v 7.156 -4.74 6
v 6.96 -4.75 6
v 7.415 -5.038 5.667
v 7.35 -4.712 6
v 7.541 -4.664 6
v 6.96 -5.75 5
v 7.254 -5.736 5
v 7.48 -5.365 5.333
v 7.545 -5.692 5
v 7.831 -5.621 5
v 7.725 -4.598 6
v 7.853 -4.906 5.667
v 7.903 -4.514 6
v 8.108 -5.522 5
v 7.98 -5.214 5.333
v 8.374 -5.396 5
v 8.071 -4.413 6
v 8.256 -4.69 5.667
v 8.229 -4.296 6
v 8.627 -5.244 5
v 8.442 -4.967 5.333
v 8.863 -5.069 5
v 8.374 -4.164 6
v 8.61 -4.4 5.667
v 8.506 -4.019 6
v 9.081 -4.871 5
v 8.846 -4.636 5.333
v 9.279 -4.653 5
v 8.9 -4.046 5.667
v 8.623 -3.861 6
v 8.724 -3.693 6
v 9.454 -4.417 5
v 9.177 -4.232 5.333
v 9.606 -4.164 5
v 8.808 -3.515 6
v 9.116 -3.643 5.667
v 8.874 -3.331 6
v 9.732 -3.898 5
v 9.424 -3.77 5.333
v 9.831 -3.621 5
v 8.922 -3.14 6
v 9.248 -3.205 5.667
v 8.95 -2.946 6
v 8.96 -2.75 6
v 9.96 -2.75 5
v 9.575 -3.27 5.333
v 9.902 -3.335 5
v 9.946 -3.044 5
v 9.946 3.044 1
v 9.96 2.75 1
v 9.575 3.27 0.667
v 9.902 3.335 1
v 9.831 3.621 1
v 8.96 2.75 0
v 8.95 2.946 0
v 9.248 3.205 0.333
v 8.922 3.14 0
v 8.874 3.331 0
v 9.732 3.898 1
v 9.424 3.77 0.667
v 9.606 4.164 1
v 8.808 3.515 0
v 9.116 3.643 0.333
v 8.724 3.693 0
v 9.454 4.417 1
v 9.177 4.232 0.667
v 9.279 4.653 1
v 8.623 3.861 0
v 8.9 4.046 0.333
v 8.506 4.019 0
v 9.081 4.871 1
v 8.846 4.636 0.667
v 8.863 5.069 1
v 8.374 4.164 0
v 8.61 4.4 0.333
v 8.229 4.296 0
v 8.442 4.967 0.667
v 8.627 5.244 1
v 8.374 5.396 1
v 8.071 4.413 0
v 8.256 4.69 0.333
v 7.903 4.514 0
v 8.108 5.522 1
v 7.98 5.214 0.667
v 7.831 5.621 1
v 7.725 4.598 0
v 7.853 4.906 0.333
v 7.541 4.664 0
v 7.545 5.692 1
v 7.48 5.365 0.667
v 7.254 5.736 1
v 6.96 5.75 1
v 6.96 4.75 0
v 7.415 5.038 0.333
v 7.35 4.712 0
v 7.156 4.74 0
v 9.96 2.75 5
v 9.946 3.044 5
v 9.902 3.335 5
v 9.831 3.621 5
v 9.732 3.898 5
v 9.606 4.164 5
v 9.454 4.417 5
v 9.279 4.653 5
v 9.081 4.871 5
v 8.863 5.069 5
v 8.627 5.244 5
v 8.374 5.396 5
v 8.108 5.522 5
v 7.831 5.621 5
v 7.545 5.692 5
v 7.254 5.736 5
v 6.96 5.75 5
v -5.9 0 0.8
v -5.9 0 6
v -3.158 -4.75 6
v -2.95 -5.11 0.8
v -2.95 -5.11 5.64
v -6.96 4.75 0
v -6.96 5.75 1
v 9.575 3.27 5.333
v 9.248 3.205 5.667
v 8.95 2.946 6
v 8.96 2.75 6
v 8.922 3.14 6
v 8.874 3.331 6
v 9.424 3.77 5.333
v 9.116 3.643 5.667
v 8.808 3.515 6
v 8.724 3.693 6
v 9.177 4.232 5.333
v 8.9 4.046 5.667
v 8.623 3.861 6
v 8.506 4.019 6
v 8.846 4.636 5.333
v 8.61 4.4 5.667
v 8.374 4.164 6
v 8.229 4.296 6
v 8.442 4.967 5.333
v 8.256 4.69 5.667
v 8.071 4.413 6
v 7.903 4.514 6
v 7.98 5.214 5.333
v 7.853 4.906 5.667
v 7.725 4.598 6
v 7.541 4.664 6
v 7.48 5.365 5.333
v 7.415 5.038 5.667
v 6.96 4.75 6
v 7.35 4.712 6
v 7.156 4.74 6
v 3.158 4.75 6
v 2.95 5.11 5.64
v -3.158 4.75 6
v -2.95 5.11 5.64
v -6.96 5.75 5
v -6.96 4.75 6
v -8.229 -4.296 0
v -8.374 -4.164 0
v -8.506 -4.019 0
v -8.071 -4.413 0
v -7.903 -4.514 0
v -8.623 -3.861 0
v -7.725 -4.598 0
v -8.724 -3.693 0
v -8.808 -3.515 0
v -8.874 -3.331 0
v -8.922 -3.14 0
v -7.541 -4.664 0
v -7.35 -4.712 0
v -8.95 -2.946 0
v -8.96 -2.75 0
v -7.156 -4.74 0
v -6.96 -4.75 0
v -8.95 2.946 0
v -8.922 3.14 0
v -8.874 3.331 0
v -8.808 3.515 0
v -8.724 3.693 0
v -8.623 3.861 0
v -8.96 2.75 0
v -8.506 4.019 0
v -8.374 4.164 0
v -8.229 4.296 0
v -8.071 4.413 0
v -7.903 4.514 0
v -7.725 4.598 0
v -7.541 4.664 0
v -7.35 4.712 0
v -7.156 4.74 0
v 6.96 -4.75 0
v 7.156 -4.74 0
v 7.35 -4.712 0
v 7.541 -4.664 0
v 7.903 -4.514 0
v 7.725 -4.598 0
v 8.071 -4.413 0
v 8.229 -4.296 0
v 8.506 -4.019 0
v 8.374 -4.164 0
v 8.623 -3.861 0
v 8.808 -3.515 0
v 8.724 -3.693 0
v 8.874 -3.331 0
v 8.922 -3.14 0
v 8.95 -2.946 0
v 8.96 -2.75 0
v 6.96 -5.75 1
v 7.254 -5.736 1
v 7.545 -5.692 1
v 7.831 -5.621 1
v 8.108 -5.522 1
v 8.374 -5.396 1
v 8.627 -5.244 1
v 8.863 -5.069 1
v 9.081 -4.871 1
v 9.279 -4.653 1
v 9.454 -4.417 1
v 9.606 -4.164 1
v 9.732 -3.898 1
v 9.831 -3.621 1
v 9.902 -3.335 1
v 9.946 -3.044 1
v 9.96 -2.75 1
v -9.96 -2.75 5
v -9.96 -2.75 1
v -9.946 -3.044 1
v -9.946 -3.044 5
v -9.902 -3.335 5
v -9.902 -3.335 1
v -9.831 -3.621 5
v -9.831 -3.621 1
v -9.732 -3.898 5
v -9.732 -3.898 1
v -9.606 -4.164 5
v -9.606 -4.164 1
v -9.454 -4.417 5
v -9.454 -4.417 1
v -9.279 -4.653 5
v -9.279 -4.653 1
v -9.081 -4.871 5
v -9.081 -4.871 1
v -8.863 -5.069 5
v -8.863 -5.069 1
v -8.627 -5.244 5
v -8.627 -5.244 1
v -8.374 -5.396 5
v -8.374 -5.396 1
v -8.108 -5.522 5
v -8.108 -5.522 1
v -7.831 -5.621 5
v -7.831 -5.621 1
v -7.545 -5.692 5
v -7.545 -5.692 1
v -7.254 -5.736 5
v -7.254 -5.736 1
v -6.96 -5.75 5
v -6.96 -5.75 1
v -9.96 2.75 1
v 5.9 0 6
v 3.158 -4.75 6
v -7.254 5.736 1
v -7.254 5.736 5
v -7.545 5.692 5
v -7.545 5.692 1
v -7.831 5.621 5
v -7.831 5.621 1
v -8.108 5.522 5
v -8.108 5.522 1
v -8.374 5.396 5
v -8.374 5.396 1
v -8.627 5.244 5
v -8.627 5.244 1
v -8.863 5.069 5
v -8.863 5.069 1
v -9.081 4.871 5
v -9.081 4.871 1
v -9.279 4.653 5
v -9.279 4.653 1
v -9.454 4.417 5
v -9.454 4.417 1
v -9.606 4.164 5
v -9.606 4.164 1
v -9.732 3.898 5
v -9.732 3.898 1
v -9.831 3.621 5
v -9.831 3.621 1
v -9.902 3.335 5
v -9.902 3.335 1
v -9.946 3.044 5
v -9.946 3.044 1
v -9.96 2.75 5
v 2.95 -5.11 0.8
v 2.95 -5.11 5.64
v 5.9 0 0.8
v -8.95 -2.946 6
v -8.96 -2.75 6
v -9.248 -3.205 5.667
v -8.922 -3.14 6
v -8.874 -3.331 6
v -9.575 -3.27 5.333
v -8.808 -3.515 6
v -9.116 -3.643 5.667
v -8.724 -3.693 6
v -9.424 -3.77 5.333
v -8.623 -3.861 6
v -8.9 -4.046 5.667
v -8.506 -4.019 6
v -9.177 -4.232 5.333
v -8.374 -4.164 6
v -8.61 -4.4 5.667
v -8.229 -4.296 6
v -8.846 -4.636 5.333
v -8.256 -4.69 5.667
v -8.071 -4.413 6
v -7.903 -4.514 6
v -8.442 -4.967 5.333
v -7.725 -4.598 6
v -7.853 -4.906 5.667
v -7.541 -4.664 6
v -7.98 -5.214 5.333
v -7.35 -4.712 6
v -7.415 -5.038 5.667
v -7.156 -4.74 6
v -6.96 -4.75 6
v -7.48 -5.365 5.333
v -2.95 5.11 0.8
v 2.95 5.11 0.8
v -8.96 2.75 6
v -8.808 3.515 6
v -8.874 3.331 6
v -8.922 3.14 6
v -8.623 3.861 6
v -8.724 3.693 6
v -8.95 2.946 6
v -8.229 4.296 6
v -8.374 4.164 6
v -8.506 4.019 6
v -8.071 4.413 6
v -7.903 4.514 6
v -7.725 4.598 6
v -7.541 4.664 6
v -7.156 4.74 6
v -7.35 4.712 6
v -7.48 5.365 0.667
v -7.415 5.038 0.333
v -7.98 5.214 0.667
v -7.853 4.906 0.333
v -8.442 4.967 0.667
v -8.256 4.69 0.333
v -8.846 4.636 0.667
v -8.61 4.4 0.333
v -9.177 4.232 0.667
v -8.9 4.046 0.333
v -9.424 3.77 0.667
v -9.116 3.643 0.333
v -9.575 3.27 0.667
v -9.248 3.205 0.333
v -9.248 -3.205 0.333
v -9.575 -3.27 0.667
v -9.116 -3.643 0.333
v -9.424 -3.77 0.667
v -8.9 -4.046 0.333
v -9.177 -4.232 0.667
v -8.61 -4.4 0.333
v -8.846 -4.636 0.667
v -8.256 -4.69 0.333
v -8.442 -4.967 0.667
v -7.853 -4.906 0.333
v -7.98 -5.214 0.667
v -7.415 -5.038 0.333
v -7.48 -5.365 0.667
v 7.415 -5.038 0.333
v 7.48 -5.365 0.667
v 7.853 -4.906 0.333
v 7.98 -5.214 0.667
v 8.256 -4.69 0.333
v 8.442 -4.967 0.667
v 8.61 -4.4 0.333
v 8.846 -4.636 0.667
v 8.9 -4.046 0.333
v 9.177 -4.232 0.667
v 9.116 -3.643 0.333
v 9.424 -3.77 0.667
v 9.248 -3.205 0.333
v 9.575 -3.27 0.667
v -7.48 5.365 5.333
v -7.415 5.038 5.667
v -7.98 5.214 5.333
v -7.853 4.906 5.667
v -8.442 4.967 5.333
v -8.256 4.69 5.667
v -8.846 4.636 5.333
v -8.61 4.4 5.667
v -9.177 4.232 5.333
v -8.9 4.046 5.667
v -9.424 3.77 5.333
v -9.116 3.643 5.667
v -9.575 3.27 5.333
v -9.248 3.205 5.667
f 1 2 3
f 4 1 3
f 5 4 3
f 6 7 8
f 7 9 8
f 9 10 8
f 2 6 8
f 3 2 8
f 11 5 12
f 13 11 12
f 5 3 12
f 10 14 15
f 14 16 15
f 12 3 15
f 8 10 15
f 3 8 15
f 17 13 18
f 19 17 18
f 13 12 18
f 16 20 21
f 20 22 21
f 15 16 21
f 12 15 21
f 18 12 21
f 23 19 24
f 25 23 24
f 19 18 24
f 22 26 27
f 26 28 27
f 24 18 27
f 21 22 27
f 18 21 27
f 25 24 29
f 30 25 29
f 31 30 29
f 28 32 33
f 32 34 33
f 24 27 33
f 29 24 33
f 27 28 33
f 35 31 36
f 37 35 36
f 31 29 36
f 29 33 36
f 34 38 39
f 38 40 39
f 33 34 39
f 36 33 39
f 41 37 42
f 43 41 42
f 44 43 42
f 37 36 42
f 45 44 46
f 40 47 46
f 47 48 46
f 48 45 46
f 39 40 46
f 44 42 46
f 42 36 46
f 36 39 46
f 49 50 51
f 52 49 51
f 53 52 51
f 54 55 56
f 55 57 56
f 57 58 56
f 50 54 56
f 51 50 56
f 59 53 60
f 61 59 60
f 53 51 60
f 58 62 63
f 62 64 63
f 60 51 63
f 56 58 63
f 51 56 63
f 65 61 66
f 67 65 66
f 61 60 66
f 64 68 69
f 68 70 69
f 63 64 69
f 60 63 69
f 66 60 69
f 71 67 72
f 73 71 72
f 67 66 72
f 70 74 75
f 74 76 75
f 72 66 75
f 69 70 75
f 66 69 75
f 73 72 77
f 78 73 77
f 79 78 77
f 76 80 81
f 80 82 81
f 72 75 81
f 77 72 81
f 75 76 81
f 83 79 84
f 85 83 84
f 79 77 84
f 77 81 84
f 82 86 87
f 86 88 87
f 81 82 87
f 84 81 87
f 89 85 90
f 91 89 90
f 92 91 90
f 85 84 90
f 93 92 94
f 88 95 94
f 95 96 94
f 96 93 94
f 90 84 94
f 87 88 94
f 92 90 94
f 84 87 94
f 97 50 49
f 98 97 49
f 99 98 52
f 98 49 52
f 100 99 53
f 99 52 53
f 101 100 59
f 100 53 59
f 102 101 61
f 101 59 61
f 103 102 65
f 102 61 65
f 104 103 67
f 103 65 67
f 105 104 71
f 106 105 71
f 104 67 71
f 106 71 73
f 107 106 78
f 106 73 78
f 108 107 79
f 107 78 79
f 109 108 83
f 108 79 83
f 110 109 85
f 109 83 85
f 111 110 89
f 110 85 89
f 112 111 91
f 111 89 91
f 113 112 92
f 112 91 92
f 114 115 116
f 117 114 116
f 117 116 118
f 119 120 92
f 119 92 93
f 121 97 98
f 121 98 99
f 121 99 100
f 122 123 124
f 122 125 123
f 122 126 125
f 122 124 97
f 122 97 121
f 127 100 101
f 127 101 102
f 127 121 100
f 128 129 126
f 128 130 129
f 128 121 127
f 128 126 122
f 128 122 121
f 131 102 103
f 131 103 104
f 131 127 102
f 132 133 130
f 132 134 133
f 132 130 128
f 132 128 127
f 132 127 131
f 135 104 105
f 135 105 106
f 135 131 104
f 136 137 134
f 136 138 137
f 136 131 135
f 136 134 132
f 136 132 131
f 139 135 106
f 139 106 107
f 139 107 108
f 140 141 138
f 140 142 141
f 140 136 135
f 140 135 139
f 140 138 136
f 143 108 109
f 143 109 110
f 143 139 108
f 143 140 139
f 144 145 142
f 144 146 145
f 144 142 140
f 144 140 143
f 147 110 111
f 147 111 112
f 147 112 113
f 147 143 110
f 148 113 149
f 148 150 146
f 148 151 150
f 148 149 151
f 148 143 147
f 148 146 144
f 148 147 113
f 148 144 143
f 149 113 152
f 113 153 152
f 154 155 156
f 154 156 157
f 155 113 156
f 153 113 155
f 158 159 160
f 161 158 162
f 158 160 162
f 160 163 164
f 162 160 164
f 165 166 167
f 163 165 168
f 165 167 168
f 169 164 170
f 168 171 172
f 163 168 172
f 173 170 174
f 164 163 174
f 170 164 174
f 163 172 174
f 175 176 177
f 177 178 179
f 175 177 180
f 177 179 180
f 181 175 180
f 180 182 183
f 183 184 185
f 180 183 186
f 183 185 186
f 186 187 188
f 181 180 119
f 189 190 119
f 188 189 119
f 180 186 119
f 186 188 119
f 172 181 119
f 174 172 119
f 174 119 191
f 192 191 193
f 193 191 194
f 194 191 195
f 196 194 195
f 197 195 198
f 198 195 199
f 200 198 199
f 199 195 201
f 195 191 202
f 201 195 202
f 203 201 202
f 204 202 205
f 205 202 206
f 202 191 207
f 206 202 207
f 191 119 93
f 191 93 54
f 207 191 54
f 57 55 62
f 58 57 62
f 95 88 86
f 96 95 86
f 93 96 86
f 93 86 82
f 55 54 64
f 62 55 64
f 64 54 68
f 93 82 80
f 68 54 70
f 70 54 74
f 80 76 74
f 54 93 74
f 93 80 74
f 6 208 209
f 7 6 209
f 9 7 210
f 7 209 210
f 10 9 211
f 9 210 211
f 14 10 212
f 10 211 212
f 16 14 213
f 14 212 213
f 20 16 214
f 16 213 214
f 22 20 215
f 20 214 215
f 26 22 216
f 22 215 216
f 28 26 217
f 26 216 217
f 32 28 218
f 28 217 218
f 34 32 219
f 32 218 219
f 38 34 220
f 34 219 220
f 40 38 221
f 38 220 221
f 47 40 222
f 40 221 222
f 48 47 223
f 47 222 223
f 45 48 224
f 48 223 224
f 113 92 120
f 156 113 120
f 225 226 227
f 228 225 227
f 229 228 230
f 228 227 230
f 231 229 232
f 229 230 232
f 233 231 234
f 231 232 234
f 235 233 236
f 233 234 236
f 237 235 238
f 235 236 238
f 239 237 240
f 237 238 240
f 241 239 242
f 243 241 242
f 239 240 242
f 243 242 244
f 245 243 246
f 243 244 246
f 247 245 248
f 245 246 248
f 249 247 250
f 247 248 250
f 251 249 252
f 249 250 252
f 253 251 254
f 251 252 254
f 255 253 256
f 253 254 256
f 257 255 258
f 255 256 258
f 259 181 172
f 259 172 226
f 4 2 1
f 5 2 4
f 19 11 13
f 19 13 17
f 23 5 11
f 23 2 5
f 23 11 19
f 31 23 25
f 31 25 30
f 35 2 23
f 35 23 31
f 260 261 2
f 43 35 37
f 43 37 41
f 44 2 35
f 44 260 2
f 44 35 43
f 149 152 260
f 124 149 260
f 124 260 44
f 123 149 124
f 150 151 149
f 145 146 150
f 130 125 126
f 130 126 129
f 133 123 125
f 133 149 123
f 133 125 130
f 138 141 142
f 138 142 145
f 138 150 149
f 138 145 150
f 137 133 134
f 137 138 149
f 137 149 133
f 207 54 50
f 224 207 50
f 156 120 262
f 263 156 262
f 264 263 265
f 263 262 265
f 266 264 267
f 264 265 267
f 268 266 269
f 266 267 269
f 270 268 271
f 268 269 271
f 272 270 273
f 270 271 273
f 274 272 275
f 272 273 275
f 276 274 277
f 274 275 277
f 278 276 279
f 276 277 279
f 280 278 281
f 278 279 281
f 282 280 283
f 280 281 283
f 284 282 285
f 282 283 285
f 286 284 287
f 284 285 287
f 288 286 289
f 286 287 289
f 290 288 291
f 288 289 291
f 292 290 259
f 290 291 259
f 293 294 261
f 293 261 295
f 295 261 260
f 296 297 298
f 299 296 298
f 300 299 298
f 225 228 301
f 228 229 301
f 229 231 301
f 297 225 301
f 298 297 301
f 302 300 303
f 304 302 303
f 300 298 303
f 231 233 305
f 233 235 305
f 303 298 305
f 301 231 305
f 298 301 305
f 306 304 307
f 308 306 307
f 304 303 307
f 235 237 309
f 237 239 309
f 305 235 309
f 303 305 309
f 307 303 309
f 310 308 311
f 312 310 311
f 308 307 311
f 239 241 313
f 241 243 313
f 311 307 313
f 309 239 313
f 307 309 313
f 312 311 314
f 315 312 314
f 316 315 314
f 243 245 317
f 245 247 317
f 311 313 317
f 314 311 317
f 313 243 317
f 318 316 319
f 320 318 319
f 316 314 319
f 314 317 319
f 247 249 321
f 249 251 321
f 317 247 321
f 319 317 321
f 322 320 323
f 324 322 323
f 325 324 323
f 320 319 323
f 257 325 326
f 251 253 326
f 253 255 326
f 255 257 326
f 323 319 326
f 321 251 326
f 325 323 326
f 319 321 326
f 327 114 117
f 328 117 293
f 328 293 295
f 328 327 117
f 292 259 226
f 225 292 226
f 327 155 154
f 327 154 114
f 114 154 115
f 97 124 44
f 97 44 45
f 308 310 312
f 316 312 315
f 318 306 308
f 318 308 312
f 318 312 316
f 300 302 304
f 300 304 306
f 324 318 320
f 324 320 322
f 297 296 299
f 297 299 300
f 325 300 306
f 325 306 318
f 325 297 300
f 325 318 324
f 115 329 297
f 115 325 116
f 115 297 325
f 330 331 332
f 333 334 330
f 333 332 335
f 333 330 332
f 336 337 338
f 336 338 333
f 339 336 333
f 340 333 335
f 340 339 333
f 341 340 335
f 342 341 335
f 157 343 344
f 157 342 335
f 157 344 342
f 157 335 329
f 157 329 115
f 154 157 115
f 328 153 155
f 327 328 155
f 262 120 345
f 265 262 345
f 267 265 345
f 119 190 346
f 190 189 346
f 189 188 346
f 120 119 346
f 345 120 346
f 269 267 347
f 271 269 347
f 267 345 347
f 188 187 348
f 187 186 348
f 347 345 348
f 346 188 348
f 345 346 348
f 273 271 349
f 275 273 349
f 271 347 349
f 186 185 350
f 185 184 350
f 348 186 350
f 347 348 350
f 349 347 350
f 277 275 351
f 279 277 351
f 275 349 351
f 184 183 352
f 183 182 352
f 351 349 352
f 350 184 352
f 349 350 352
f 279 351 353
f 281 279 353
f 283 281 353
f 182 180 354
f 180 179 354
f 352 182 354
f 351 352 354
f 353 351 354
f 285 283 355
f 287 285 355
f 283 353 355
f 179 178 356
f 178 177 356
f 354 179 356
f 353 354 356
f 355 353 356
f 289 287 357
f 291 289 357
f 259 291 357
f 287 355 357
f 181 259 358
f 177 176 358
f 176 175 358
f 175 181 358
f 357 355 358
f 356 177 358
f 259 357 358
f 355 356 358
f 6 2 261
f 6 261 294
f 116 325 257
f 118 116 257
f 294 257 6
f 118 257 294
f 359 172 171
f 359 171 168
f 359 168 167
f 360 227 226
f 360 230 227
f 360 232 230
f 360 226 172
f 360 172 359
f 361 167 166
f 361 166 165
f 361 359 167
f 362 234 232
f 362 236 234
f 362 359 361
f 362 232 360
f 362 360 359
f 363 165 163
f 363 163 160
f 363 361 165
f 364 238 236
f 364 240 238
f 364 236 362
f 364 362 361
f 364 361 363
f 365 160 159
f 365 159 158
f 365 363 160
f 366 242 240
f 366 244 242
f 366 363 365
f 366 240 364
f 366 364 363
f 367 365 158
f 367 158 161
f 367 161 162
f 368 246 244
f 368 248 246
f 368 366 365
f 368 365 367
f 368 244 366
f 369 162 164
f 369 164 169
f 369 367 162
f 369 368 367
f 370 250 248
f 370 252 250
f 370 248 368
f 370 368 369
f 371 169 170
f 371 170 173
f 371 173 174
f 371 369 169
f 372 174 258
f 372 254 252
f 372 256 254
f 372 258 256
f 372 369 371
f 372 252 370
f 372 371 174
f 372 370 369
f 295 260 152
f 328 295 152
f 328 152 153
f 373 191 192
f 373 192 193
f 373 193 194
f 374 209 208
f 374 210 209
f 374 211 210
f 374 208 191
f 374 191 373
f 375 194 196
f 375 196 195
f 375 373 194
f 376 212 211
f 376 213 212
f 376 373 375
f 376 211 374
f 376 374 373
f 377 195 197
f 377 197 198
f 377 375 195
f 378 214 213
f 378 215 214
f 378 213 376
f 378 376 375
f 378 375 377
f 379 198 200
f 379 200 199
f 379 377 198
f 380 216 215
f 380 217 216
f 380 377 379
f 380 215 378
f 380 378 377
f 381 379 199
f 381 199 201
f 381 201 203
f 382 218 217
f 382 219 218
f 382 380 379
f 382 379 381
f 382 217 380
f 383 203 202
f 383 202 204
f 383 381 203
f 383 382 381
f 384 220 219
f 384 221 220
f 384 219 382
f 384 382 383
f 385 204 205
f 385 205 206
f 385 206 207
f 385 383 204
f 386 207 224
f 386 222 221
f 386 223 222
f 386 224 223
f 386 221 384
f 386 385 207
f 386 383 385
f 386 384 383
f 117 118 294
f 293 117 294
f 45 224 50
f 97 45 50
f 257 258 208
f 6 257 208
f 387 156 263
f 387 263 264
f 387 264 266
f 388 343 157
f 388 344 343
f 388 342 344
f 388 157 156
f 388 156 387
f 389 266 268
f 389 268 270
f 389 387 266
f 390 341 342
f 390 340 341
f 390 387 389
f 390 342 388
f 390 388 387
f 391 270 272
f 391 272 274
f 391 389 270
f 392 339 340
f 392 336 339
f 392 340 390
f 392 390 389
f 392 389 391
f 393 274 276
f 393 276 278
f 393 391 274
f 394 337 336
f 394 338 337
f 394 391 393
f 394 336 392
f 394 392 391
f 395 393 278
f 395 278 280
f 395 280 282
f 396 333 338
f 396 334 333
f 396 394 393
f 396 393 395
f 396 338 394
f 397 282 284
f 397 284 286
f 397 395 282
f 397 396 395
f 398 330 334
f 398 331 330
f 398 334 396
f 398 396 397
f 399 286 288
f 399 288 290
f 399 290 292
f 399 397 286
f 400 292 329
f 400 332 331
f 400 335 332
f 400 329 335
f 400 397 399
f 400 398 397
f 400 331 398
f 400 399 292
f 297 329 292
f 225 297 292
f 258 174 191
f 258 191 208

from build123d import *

# Parameters (mm, degrees)
F1_DEPTH     = 6
F3_DEPTH     = 5.2
F4_T1_DEPTH  = 13.92
F4_T3_DEPTH  = 5.5
F4_T6_ANGLE  = 90
F4_T8_ANGLE  = 90
F4_T10_ANGLE = 90
F4_T12_ANGLE = 90
F4_T14_ANGLE = 90
F4_T16_ANGLE = 90
F4_T18_ANGLE = 90
F4_T20_ANGLE = 90


# Not quite as in the source:
# - a fillet or chamfer that OpenCascade refuses, or shapes differently, is made with other operations: its cross-section is extruded or revolved along the edge and cut away or added


with BuildPart() as f1:
    # F0 (on Top) → F1 (new body)
    with BuildSketch(Plane.XY):
        with BuildLine():
            Line((6.96, 5.75), (-6.96, 5.75))
            ThreePointArc((-6.96, 5.75), (-9.0813203436, 4.8713203436), (-9.96, 2.75))
            Line((-9.96, 2.75), (-9.96, -2.75))
            ThreePointArc((-9.96, -2.75), (-9.0813203436, -4.8713203436), (-6.96, -5.75))
            Line((-6.96, -5.75), (6.96, -5.75))
            ThreePointArc((6.96, -5.75), (9.0813203436, -4.8713203436), (9.96, -2.75))
            Line((9.96, -2.75), (9.96, 2.75))
            ThreePointArc((9.96, 2.75), (9.0813203436, 4.8713203436), (6.96, 5.75))
        make_face()
    extrude(amount=F1_DEPTH)

    # F2 (on face) → F3 (cut)
    with BuildSketch(Plane.XY.offset(6)):
        Polygon((2.95, 5.1095498823), (-2.95, 5.1095498823), (-5.9, 0), (-2.95, -5.1095498823), (2.95, -5.1095498823), (5.9, 0), align=None)
    extrude(amount=-F3_DEPTH, mode=Mode.SUBTRACT)

    # F4: chamfer of 1 on 2 edges, made by hand

    # F4_s2 → F4_t1 (cut)
    with BuildSketch(Plane.YZ.offset(-6.96)):
        Polygon((5.75, 5), (4.75, 6), (5.75, 6), align=None)
        Polygon((5.75, 1), (4.75, 0), (5.75, 0), align=None)
        Polygon((-4.75, 0), (-5.75, 1), (-5.75, 0), align=None)
        Polygon((-4.75, 6), (-5.75, 5), (-5.75, 6), align=None)
    extrude(amount=F4_T1_DEPTH, mode=Mode.SUBTRACT)

    # F4_s4 → F4_t3 (cut)
    with BuildSketch(Plane.XZ.offset(-2.75)):
        Polygon((-8.96, 0), (-9.96, 1), (-9.96, 0), align=None)
        Polygon((8.96, 0), (9.96, 1), (9.96, 0), align=None)
        Polygon((-8.96, 6), (-9.96, 5), (-9.96, 6), align=None)
        Polygon((8.96, 6), (9.96, 5), (9.96, 6), align=None)
    extrude(amount=F4_T3_DEPTH, mode=Mode.SUBTRACT)

    # F4_s5 → F4_t6 (revolve, cut)
    with BuildSketch(Plane.XZ.offset(-2.75)):
        Polygon((9.96, 1), (8.96, 0), (9.96, 0), align=None)
    revolve(axis=Axis((6.96, 2.75, 0), (0, 0, 1)), revolution_arc=F4_T6_ANGLE, mode=Mode.SUBTRACT)

    # F4_s7 → F4_t8 (revolve, cut)
    with BuildSketch(Plane.YZ.offset(-6.96)):
        Polygon((5.75, 1), (4.75, 0), (5.75, 0), align=None)
    revolve(axis=Axis((-6.96, 2.75, 0), (0, 0, 1)), revolution_arc=F4_T8_ANGLE, mode=Mode.SUBTRACT)

    # F4_s9 → F4_t10 (revolve, cut)
    with BuildSketch(Plane.XZ.offset(2.75)):
        Polygon((-8.96, 0), (-9.96, 1), (-9.96, 0), align=None)
    revolve(axis=Axis((-6.96, -2.75, 0), (0, 0, 1)), revolution_arc=F4_T10_ANGLE, mode=Mode.SUBTRACT)

    # F4_s11 → F4_t12 (revolve, cut)
    with BuildSketch(Plane.YZ.offset(6.96)):
        Polygon((-4.75, 0), (-5.75, 1), (-5.75, 0), align=None)
    revolve(axis=Axis((6.96, -2.75, 0), (0, 0, 1)), revolution_arc=F4_T12_ANGLE, mode=Mode.SUBTRACT)

    # F4_s13 → F4_t14 (revolve, cut)
    with BuildSketch(Plane.XZ.offset(-2.75)):
        Polygon((9.96, 5), (8.96, 6), (9.96, 6), align=None)
    revolve(axis=Axis((6.96, 2.75, 6), (0, 0, 1)), revolution_arc=F4_T14_ANGLE, mode=Mode.SUBTRACT)

    # F4_s15 → F4_t16 (revolve, cut)
    with BuildSketch(Plane.YZ.offset(-6.96)):
        Polygon((5.75, 5), (4.75, 6), (5.75, 6), align=None)
    revolve(axis=Axis((-6.96, 2.75, 6), (0, 0, 1)), revolution_arc=F4_T16_ANGLE, mode=Mode.SUBTRACT)

    # F4_s17 → F4_t18 (revolve, cut)
    with BuildSketch(Plane.XZ.offset(2.75)):
        Polygon((-8.96, 6), (-9.96, 5), (-9.96, 6), align=None)
    revolve(axis=Axis((-6.96, -2.75, 6), (0, 0, 1)), revolution_arc=F4_T18_ANGLE, mode=Mode.SUBTRACT)

    # F4_s19 → F4_t20 (revolve, cut)
    with BuildSketch(Plane.YZ.offset(6.96)):
        Polygon((-4.75, 6), (-5.75, 5), (-5.75, 6), align=None)
    revolve(axis=Axis((6.96, -2.75, 6), (0, 0, 1)), revolution_arc=F4_T20_ANGLE, mode=Mode.SUBTRACT)


solid = f1.part
